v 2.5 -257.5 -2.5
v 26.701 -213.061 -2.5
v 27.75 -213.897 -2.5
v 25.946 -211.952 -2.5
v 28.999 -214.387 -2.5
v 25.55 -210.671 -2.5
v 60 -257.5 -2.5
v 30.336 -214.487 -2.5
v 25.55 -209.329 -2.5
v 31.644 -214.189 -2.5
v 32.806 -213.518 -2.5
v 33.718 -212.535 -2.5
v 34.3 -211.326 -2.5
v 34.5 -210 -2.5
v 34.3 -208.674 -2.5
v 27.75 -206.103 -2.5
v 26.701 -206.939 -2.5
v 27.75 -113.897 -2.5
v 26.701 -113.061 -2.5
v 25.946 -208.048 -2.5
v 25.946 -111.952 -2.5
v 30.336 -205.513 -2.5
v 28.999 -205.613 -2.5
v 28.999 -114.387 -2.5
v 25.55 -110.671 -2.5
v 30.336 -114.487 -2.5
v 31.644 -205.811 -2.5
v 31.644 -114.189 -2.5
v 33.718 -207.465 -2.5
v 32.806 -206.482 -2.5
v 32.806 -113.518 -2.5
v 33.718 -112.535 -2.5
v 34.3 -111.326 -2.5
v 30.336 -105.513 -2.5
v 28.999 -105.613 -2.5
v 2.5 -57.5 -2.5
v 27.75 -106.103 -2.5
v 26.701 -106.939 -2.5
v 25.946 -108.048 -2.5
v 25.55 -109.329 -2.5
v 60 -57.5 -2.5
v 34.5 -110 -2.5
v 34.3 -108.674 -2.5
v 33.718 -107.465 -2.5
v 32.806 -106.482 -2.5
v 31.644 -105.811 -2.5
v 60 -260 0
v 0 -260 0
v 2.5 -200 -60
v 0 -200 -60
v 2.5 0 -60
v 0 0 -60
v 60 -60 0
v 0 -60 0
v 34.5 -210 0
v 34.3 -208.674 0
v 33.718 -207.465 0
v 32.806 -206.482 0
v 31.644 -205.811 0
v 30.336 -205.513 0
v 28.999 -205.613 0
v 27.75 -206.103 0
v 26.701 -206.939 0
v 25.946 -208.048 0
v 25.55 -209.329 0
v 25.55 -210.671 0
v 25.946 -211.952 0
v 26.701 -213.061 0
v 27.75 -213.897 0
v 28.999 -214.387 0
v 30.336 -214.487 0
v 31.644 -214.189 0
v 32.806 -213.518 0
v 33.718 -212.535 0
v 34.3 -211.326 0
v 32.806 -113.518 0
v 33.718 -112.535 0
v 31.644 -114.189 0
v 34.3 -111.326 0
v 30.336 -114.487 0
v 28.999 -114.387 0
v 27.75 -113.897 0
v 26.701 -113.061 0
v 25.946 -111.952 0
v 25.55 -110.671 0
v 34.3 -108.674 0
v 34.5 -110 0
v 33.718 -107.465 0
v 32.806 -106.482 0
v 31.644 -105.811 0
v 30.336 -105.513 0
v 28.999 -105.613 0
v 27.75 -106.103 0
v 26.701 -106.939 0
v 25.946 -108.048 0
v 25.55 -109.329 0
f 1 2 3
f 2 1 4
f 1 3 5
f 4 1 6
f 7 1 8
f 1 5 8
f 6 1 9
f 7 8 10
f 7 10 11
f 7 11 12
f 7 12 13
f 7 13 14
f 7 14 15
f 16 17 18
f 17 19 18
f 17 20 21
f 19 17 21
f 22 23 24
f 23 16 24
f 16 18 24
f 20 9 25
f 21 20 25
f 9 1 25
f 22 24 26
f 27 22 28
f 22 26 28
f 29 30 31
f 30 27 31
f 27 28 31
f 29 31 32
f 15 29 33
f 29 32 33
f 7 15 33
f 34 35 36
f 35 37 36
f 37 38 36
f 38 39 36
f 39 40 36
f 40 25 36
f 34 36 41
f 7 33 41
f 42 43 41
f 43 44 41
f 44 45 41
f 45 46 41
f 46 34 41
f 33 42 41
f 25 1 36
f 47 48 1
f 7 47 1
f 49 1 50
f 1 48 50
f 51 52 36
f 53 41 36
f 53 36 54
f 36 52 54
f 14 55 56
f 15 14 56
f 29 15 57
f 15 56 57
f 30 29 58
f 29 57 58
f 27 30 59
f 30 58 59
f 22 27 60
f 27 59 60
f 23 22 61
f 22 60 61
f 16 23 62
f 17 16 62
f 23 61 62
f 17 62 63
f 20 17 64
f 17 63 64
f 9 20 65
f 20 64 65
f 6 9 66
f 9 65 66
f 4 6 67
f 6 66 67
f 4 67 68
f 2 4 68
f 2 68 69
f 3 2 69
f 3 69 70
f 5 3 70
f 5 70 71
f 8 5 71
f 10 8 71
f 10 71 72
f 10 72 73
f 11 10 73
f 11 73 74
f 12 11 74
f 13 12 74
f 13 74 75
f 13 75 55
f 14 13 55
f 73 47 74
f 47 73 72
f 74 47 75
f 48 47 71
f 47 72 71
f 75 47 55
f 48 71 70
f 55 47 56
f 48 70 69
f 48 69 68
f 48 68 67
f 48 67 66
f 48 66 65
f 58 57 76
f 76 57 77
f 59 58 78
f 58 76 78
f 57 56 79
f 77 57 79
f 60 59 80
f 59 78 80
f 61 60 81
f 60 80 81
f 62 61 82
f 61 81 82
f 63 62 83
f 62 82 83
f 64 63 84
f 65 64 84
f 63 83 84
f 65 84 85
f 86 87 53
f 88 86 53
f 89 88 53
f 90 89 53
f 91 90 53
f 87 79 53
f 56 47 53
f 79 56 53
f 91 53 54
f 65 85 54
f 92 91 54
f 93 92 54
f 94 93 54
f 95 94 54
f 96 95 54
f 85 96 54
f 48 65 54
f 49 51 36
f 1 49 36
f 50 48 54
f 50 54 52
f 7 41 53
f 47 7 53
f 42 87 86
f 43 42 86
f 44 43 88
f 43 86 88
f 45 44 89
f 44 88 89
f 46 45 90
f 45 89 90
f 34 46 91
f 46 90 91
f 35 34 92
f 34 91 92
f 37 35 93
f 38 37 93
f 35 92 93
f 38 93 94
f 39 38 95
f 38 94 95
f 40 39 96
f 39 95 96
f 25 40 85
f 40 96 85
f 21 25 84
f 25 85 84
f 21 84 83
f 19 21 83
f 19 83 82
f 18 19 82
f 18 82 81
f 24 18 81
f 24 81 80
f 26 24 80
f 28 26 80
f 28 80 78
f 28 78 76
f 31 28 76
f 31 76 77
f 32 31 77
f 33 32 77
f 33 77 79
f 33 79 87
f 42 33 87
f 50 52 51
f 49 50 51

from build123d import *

# Parameters (mm, degrees)
F1_DEPTH = 260
F3_DEPTH = 60.001
F4_R     = 4.5
F5_DEPTH = 60.001


with BuildPart() as f1:
    # F0 (on Front) → F1 (new body)
    with BuildSketch(Plane.XZ):
        Polygon((60, 0), (0, 0), (0, -60), (2.5, -60), (2.5, -2.5), (60, -2.5), align=None)
    extrude(amount=F1_DEPTH)

    # F2 (on face) → F3 (cut, through all)
    with BuildSketch(Plane(origin=(0, 0, 0), x_dir=(0, -1, 0), z_dir=(-1, 0, 0))):
        Polygon((0, 0), (0, -60), (60, 0), align=None)
        Polygon((260, -60), (260, 0), (200, -60), align=None)
    extrude(amount=-F3_DEPTH, mode=Mode.SUBTRACT)

    # F4 (on face) → F5 (cut, through all)
    with BuildSketch(Plane.XY):
        with Locations((30, -110)):
            Circle(F4_R)
        with Locations((30, -210)):
            Circle(F4_R)
    extrude(amount=-F5_DEPTH, mode=Mode.SUBTRACT)


solid = f1.part
